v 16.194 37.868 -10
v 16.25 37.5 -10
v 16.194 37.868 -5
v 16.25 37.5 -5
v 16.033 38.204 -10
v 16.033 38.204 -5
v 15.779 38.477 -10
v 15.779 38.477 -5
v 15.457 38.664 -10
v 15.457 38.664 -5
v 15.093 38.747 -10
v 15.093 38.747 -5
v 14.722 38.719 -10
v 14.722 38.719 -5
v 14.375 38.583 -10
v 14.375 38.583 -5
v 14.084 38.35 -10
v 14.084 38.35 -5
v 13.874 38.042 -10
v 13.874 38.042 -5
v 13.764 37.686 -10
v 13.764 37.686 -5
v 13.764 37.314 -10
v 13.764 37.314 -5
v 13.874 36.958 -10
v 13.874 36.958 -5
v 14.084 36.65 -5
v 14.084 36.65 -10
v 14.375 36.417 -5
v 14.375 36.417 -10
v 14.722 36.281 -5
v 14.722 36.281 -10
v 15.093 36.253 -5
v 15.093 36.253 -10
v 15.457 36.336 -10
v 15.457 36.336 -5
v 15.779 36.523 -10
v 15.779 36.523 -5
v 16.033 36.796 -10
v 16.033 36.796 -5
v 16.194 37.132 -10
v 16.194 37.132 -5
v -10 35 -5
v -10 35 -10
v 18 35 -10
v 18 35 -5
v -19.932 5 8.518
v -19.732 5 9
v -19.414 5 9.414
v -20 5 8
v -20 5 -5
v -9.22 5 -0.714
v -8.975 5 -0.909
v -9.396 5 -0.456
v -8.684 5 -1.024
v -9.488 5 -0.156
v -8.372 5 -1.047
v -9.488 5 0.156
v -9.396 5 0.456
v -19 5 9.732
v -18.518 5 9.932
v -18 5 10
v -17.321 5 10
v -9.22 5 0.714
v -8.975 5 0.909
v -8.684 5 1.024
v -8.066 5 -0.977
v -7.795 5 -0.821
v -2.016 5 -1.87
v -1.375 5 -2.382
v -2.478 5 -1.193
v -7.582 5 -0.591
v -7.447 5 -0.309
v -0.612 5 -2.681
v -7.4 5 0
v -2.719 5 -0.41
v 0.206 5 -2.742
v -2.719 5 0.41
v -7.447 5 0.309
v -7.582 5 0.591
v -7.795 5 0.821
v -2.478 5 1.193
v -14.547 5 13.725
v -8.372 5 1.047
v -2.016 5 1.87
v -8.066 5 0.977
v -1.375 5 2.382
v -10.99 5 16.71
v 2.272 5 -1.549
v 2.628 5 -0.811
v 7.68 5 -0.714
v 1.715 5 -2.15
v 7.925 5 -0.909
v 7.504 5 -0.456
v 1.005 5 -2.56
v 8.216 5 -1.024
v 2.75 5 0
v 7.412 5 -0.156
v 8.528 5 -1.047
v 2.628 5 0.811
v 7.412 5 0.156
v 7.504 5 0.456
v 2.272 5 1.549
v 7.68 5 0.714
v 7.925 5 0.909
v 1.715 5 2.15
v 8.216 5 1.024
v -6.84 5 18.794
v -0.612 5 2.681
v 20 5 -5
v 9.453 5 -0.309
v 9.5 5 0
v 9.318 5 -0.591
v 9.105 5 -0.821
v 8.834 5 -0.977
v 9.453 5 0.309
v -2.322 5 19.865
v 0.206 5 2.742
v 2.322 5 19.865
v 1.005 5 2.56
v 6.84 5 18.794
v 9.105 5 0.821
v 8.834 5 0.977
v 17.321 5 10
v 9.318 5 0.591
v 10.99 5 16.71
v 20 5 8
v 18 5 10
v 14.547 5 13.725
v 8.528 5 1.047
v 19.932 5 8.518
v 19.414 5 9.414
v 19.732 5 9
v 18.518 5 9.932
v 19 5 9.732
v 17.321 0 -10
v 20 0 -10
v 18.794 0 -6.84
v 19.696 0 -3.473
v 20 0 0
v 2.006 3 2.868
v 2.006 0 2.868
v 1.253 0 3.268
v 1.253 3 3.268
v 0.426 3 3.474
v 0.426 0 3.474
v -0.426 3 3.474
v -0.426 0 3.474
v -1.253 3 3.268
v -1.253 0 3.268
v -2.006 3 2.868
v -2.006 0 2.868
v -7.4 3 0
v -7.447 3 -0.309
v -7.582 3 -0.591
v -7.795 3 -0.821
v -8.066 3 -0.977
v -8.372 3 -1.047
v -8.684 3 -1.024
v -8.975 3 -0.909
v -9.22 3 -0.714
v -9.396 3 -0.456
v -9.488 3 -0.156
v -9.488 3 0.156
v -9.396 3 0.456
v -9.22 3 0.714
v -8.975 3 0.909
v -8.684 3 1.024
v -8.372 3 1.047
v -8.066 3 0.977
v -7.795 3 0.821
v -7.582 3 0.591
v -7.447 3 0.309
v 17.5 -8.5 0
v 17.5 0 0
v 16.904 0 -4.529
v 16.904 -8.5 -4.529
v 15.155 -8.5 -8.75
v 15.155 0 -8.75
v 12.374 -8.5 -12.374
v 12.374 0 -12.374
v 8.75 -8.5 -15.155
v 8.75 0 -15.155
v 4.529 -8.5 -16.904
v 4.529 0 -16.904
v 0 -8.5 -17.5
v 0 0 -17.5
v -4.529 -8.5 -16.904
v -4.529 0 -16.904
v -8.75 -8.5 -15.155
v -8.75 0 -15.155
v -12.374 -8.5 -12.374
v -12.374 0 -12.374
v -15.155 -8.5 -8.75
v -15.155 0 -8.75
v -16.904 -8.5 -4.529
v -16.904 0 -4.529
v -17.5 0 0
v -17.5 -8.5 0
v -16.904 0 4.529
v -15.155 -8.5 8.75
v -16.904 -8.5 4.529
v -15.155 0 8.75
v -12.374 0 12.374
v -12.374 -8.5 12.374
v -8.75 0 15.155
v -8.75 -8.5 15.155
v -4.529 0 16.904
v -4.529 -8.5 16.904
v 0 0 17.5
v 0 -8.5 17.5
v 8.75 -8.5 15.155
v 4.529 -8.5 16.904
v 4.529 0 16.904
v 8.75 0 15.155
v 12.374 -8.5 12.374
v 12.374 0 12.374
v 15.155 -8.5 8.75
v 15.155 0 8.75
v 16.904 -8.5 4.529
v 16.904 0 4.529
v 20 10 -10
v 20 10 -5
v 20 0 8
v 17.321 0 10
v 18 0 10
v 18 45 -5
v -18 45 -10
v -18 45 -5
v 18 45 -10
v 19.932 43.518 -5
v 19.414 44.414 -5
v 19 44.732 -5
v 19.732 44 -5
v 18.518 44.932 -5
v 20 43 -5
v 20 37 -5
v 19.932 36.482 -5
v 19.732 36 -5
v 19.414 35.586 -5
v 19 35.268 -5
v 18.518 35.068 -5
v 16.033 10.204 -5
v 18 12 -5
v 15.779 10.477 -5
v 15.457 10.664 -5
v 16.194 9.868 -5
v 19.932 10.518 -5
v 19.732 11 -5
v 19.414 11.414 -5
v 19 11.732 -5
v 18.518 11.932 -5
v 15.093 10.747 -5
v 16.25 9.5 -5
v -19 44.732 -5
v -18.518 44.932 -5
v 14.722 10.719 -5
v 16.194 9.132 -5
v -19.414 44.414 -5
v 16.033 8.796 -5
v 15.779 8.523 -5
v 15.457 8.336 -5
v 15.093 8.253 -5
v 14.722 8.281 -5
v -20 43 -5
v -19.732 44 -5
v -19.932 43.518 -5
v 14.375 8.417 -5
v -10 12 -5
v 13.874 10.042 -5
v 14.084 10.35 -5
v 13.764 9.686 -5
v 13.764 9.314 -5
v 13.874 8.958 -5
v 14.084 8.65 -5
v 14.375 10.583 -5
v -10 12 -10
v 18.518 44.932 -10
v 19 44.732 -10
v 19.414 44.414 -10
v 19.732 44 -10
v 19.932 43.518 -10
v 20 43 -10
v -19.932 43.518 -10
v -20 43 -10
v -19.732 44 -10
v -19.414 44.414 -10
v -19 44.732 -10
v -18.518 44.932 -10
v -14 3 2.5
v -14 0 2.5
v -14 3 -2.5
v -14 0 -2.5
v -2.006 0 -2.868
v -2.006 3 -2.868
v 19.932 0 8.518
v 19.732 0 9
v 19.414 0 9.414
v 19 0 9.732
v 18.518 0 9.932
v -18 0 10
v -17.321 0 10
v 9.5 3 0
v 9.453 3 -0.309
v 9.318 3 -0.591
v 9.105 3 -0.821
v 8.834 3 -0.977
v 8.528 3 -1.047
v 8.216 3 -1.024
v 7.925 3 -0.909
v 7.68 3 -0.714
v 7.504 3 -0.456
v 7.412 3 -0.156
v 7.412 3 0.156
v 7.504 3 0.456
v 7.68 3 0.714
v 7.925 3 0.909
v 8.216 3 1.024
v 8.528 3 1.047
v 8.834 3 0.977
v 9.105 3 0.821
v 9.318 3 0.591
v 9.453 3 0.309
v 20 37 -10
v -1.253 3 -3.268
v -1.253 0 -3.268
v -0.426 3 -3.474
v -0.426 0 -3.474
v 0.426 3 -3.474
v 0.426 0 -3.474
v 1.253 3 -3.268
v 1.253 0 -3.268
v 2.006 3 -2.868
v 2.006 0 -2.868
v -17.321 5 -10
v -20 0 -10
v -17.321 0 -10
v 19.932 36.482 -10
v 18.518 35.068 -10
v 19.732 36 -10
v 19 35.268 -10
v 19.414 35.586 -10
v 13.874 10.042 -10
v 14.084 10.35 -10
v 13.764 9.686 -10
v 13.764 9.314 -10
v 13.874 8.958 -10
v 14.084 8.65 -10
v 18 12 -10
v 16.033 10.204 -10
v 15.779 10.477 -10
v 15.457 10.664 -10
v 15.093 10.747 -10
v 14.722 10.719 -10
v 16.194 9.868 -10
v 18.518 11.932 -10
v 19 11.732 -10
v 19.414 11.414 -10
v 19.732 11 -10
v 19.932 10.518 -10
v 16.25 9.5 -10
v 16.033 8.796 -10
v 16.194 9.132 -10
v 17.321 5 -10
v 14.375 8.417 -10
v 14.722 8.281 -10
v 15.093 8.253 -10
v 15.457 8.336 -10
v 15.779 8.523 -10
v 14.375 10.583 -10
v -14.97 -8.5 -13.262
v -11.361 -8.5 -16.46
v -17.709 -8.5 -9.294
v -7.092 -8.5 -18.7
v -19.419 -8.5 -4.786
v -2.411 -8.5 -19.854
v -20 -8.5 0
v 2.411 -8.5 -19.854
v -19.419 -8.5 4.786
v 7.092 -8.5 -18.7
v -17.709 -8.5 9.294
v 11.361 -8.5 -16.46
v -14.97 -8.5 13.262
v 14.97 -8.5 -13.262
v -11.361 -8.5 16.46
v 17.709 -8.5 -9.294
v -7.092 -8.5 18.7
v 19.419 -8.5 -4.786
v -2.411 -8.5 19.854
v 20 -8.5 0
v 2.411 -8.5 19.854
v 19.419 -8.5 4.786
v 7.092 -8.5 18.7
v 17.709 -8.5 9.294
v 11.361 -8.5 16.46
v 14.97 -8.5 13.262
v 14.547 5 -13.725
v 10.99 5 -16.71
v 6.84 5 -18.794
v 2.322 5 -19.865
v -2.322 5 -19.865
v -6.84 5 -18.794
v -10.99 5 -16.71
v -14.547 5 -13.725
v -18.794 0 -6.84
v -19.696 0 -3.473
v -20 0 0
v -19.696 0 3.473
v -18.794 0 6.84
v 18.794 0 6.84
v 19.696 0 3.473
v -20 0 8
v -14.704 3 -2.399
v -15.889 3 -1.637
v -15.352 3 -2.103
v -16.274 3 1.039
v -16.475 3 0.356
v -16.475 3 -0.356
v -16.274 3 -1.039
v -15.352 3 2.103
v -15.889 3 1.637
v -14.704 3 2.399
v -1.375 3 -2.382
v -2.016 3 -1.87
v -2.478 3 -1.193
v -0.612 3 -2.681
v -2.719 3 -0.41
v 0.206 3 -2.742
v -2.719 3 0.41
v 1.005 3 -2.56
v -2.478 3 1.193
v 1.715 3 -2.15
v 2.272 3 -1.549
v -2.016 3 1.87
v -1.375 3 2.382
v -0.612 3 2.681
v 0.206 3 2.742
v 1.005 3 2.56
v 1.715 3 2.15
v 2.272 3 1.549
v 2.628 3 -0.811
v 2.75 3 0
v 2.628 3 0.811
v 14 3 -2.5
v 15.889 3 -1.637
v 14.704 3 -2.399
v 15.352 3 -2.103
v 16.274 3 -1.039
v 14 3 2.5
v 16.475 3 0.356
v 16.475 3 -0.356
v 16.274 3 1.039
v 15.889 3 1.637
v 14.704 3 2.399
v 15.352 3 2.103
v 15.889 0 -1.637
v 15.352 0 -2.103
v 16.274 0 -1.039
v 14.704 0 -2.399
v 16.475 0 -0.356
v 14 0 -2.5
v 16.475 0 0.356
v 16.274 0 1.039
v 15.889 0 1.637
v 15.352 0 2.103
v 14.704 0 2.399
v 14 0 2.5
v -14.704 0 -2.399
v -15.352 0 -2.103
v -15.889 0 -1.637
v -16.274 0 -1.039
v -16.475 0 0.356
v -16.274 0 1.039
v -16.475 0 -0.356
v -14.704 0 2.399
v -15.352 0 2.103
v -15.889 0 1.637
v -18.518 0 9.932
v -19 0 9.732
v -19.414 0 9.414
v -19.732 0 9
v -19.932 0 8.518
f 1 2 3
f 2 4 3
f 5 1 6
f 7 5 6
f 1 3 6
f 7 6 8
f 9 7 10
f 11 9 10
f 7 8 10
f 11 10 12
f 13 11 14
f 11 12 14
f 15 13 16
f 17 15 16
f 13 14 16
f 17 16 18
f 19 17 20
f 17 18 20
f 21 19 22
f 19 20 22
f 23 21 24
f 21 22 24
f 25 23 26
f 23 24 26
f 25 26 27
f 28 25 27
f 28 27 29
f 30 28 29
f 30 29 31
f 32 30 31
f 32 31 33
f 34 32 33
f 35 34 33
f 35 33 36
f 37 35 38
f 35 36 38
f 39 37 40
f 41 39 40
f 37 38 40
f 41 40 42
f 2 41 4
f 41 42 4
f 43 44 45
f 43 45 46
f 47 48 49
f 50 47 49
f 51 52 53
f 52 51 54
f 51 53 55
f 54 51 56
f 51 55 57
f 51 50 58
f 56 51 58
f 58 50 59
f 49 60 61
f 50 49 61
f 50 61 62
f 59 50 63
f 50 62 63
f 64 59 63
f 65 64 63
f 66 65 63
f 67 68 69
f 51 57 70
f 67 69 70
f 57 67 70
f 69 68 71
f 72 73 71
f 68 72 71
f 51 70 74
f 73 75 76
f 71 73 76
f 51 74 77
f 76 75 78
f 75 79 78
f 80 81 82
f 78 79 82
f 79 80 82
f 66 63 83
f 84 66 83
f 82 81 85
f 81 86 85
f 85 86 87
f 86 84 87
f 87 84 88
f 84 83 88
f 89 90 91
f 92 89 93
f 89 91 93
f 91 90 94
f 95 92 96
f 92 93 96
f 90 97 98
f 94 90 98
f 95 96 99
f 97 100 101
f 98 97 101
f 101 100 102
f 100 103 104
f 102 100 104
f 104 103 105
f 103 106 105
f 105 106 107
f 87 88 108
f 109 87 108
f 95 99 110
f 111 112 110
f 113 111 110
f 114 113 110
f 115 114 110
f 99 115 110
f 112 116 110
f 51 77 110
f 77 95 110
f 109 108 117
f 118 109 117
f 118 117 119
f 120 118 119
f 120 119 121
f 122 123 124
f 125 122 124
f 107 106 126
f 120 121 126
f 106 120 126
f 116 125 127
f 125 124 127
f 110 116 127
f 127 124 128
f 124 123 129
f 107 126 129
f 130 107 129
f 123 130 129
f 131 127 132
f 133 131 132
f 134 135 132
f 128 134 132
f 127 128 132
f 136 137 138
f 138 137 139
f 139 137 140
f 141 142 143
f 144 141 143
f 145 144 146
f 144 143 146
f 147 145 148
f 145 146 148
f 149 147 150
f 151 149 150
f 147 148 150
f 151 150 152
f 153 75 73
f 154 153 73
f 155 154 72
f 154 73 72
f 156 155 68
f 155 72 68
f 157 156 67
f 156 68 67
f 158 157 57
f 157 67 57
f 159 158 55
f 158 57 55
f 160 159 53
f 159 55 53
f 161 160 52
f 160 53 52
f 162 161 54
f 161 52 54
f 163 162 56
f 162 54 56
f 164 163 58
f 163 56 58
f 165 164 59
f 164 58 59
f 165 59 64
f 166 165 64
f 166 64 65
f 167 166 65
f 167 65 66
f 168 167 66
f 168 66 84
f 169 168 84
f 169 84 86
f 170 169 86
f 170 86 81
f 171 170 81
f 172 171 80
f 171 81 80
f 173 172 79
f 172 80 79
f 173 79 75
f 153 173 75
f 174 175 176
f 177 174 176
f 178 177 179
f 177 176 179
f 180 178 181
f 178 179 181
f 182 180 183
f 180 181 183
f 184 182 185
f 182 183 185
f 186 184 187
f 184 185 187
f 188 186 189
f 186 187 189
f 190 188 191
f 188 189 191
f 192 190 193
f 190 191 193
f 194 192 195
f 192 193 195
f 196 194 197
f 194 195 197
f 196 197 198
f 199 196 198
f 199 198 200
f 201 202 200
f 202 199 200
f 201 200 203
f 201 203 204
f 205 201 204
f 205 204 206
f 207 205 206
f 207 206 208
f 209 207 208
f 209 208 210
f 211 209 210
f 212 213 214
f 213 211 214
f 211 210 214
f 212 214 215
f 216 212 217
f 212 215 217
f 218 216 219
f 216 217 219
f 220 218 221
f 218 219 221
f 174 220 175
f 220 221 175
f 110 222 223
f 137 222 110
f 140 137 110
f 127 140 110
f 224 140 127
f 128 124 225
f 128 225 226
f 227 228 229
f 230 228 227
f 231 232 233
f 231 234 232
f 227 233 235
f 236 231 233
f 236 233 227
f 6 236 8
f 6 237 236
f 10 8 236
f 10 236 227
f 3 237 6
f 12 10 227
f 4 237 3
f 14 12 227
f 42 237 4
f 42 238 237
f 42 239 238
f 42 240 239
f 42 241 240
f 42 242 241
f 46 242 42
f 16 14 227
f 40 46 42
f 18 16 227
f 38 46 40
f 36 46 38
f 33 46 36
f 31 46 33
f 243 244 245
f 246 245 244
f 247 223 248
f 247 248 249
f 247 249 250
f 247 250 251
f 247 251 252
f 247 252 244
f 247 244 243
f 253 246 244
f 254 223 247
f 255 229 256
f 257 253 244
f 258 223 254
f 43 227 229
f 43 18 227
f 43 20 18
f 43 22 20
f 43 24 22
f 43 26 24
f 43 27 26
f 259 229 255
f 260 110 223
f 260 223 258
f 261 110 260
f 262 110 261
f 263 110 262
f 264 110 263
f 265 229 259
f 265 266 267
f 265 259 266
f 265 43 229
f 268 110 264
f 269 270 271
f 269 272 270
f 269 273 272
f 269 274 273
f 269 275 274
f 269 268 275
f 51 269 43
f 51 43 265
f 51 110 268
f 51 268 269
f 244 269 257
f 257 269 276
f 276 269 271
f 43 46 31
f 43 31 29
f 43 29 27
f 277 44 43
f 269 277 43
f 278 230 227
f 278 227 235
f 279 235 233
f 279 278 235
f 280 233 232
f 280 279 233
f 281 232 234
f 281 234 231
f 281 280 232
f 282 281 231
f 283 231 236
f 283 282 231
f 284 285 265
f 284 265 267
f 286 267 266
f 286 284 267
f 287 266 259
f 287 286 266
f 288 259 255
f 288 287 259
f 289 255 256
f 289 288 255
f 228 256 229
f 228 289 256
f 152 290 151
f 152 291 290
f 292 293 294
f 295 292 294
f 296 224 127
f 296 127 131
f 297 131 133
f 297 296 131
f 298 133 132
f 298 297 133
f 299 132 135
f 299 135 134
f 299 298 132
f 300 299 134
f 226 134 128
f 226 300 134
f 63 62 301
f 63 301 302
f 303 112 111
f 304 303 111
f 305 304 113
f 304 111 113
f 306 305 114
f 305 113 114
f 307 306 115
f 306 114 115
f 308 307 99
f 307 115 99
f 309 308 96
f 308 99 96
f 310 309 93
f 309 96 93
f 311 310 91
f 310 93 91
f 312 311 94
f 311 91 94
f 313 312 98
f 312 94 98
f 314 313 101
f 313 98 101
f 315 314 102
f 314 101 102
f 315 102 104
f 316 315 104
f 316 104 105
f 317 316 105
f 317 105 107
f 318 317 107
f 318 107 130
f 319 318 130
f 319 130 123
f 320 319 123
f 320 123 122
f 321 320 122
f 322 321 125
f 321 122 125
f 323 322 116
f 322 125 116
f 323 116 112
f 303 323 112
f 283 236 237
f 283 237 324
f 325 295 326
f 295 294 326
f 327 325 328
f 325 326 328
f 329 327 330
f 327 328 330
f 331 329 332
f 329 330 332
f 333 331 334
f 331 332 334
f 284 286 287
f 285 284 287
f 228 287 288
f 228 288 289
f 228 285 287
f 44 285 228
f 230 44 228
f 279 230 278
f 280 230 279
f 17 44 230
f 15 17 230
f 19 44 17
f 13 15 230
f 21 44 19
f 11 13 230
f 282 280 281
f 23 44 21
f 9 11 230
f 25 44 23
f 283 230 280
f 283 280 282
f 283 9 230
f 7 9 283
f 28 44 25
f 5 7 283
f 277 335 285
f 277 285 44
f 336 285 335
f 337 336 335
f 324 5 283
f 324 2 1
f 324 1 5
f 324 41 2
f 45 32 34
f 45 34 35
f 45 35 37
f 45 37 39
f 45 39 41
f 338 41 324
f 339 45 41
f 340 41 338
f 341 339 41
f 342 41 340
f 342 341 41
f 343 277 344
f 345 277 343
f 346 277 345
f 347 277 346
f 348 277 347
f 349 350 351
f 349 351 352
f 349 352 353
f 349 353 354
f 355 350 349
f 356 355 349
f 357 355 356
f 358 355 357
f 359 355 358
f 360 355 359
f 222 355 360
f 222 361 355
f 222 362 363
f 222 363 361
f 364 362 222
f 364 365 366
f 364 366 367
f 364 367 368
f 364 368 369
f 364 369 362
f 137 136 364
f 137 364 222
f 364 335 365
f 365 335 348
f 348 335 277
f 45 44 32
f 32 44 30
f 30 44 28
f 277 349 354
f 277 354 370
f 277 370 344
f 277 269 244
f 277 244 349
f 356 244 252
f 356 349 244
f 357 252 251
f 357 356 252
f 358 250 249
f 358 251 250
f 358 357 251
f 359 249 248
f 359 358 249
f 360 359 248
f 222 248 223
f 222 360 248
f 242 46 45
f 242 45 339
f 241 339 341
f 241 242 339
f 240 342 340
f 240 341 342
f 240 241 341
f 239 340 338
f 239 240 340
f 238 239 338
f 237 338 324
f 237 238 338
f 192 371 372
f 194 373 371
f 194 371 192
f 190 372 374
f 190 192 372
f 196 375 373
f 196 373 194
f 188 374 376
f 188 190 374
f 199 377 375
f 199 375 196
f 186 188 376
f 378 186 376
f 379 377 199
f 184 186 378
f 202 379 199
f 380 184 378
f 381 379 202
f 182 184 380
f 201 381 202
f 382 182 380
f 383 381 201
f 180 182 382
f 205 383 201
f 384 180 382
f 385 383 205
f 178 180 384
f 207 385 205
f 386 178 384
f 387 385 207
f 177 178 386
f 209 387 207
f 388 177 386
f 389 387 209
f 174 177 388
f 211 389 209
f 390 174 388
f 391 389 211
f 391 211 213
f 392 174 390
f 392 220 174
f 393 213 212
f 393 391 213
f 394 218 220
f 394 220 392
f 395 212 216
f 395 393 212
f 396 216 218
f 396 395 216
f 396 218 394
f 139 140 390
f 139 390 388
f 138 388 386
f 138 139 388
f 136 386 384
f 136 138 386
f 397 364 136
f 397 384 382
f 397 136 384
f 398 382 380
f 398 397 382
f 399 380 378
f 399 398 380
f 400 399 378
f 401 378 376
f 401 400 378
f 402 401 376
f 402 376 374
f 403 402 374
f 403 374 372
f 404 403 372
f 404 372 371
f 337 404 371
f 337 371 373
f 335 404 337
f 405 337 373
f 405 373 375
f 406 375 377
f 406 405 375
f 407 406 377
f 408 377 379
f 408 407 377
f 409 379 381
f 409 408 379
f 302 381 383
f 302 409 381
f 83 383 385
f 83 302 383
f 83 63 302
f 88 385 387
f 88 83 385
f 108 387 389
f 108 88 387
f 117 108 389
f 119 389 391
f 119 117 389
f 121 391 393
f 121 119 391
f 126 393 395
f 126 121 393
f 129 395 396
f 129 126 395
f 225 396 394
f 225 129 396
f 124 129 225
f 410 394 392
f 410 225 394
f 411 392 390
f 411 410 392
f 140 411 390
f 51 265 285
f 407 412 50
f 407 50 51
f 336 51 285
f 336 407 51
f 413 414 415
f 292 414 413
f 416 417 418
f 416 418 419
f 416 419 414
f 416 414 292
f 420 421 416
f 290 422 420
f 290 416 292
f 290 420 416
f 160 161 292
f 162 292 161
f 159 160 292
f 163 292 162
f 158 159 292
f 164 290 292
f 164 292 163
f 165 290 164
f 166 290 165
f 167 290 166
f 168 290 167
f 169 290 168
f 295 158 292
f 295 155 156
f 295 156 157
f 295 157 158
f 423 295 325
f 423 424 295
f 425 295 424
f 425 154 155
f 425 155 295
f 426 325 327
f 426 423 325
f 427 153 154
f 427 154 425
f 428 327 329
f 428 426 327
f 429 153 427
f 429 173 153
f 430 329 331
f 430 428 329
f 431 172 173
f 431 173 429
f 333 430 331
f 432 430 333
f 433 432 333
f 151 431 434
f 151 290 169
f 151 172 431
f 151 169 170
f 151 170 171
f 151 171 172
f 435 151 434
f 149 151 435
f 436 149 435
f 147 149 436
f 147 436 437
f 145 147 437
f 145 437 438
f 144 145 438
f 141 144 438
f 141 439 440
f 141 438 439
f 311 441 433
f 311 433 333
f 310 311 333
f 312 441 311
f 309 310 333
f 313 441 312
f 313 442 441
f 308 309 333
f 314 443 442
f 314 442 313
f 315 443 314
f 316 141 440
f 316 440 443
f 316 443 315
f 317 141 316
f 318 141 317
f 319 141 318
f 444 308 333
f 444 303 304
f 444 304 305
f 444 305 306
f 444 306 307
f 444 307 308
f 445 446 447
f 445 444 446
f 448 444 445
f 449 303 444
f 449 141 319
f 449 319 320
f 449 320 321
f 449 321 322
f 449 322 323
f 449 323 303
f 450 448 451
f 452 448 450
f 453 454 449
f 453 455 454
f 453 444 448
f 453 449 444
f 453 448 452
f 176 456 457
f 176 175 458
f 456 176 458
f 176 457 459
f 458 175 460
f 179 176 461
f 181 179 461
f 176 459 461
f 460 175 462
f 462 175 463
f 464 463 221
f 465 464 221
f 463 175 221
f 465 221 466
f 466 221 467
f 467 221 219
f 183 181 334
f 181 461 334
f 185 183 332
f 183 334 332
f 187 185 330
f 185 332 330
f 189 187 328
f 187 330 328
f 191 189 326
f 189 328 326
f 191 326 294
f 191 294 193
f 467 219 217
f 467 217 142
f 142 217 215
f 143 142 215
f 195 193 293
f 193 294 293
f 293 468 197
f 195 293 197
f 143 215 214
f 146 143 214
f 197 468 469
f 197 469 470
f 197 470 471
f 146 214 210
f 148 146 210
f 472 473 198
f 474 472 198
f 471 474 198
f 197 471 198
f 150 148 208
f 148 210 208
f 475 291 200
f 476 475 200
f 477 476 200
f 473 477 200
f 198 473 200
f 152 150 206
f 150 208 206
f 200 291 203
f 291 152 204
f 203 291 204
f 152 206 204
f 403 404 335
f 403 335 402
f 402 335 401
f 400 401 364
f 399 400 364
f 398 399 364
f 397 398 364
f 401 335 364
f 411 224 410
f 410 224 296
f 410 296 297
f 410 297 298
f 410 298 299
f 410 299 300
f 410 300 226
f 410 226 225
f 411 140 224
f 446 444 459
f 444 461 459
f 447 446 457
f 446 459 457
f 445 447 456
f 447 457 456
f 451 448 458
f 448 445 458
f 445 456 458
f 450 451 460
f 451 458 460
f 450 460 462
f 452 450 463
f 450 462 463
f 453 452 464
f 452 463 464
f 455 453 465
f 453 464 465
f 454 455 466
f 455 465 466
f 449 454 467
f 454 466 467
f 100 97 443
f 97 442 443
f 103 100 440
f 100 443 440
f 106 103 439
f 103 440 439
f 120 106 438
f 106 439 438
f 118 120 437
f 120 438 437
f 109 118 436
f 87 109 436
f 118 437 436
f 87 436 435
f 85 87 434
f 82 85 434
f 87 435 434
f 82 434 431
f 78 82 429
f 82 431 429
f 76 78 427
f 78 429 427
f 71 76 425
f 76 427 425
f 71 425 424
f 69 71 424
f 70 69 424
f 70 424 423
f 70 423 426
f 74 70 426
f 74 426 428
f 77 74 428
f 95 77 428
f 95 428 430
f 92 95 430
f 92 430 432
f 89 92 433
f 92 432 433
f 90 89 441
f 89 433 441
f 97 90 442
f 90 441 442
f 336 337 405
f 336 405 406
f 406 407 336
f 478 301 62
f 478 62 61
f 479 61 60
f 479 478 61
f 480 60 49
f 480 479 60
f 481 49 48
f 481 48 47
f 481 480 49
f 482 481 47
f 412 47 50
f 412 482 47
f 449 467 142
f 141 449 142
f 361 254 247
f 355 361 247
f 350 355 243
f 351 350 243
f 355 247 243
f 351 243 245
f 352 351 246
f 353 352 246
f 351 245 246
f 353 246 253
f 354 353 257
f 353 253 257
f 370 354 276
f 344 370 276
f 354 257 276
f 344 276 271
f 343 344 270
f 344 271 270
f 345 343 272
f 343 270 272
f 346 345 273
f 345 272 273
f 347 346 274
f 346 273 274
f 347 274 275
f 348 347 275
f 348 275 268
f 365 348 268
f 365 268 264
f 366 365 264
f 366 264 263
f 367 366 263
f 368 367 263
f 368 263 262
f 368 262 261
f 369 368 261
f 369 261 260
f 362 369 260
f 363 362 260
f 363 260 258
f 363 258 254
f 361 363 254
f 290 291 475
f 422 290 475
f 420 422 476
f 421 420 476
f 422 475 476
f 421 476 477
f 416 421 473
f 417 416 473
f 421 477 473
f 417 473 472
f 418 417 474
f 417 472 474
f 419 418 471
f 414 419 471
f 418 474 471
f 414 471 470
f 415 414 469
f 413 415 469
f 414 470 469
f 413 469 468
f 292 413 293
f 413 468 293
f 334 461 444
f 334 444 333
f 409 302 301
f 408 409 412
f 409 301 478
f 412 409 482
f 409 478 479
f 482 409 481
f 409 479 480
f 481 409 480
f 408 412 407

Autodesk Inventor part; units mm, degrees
ref_plane "YZ Plane" through (0, 0, 0) normal (1, 0, 0) x (0, 1, 0)
ref_plane "XZ Plane" through (0, 0, 0) normal (0, 1, 0) x (-1, 0, 0)
ref_plane "XY Plane" through (0, 0, 0) normal (0, 0, 1) x (1, 0, 0)
sketch "Sketch1" plane through (0, 0, 0) normal (0, 1, 0) x (-1, 0, 0)
  line L0 (-20, 20) -> (20, 20)
  line L1 (20, 20) -> (20, -20)
  line L2 (20, -20) -> (-20, -20)
  line L3 (-20, -20) -> (-20, 20)
  line L4 (-20, 20) -> (20, -20) construction
  line L5 (20, 20) -> (-20, -20) construction
  point P0 (0, 0)
  dimension "d0" = 40
  dimension "d1" = 40
extrude "Extrusion1" add sketch "Sketch1" along normal blind 5
sketch "Sketch4" plane through (0, 5, 0) normal (0, 1, 0) x (1, 0, 0)
  line L0 (-20, 10) -> (-10, 10)
  line L1 (-10, 10) -> (-10, 5)
  line L2 (-10, 5) -> (-20, 5)
  line L3 (-20, 5) -> (-20, 10)
  line L4 (-20, 10) -> (-10, 5) construction
  line L5 (-10, 10) -> (-20, 5) construction
  line L6 (-20, -20) -> (20, -20) projected
  line L7 (20, -20) -> (20, 20) projected
  line L8 (-20, 20) -> (-20, -20) projected
  point P0 (-15, 7.5)
  dimension "d20" = 10
  dimension "d21" = 5
  dimension "d23" = 25
extrude "Extrusion4" add sketch "Sketch4" along normal blind 40
sketch "Sketch8" plane through (-10, 5, -5) normal (1, 0, 0) x (0, 0, -1)
  line L0 (0, 40) -> (5, 40)
  line L1 (5, 40) -> (5, 30)
  line L2 (5, 30) -> (0, 30)
  line L3 (0, 30) -> (0, 40)
  line L4 (0, 7) -> (5, 7)
  line L5 (5, 7) -> (5, 0)
  line L6 (5, 0) -> (0, 0)
  line L7 (0, 0) -> (0, 7)
  line L8 (5, 0) -> (5, 40) projected
  line L9 (0, 40) -> (5, 40) projected
  point P0 (-5, -5)
  dimension "d44" = 5
  dimension "d45" = 10
  dimension "d46" = 5
  dimension "d47" = 7
  dimension "d48" = 23
extrude "Extrusion7" add sketch "Sketch8" along normal blind 30
sketch "Sketch9" plane through (-20, 5, -5) normal (0, 0, 1) x (1, 0, 0)
  circle A0 centre (35, 32.5) radius 1.25
  circle A1 centre (35, 4.5) radius 1.25
  line L0 (10, 30) -> (40, 30) projected
  line L1 (40, 40) -> (40, 30) projected
  line L2 (40, 7) -> (40, 0) projected
  point P0 (20, -5)
  dimension "d51" = 2.5
  dimension "d52" = 2.5
  dimension "d53" = 28
  dimension "d54" = 2.5
  dimension "d55" = 5
  dimension "d56" = 5
extrude "Extrusion8" cut sketch "Sketch9" against normal blind 5
sketch "Sketch11" plane through (0, 5, 0) normal (0, 1, 0) x (1, 0, 0)
  line L0 (20, -20) -> (-20, -20)
  line L1 (-20, -20) -> (-20, -10)
  line L2 (-20, -10) -> (20, -10)
  line L3 (20, -10) -> (20, -20)
  line L4 (-20, 10) -> (20, 10)
  line L5 (20, 10) -> (20, 20)
  line L6 (20, 20) -> (-20, 20)
  line L7 (-20, 20) -> (-20, 10)
  line L8 (20, 20) -> (-20, 20) projected
  line L9 (-20, -20) -> (20, -20) projected
  line L10 (20, -20) -> (20, 5) projected
  line L11 (20, 10) -> (20, 20) projected
  point P0 (0, 0)
  dimension "d59" = 40
  dimension "d60" = 10
  dimension "d61" = 40
  dimension "d62" = 10
extrude "Extrusion9" cut sketch "Sketch11" against normal blind 5
sketch "Sketch12" plane through (0, 0, 0) normal (0, -1, 0) x (1, 0, 0)
  circle A0 centre (0, 0) radius 3.5
  circle A1 centre (14, 0) radius 2.5
  circle A2 centre (-14, 0) radius 2.5
  line L0 (-20, -10) -> (20, -10) projected
  line L1 (-14, 2.5) -> (-2.0057, 2.8683)
  line L2 (-14, -2.5) -> (-2.0057, -2.8683)
  line L3 (14, 2.5) -> (2.0057, 2.8683)
  line L4 (14, -2.5) -> (2.0057, -2.8683)
  dimension "d65" = 7
  dimension "d66" = 5
  dimension "d67" = 5
  dimension "d68" = 14
  dimension "d69" = 10
  dimension "d70" = 10
  dimension "d71" = 14
  dimension "d72" = 12
  dimension "d73" = 12
extrude "Extrusion10" cut sketch "Sketch12" against normal blind 3
sketch "Sketch13" plane through (0, 3, 0) normal (0, -1, 0) x (1, 0, 0)
  circle A0 centre (0, 0) radius 2.75
  dimension "d76" = 5.5
extrude "Extrusion11" cut sketch "Sketch13" against normal blind 3
fillet "Fillet1" radius 2 6 edges at (20, 45, -7.5) (20, 35, -7.5) (20, 12, -7.5) (20, 2.5, 10) (-20, 2.5, 10) (-20, 45, -7.5)
sketch "Sketch14" plane through (0, 0, 0) normal (0, -1, 0) x (1, 0, 0)
  circle A0 centre (0, 0) radius 17.5
  circle A1 centre (0, 0) radius 20
  dimension "d80" = 35
  dimension "d81" = 40
extrude "Extrusion12" add sketch "Sketch14" along normal blind 8.5
sketch "Sketch15" plane through (0, 0, 0) normal (0, -1, 0) x (1, 0, 0)
  circle A0 centre (0, 0) radius 17.5 projected
  arc A1 (2.0057, 2.8683) -> (-2.0057, 2.8683) centre (0, 0) ccw projected
  line L0 (2.0057, 2.8683) -> (14, 2.5) projected
  arc A2 (14, -2.5) -> (14, 2.5) centre (14, 0) ccw projected
  line L1 (14, -2.5) -> (2.0057, -2.8683) projected
  arc A3 (-2.0057, -2.8683) -> (2.0057, -2.8683) centre (0, 0) ccw projected
  line L2 (-2.0057, -2.8683) -> (-14, -2.5) projected
  arc A4 (-14, 2.5) -> (-14, -2.5) centre (-14, 0) ccw projected
  line L3 (-14, 2.5) -> (-2.0057, 2.8683) projected
  arc A5 (14.3614, -10) -> (14.3614, 10) centre (0, 0) ccw projected
  line L4 (14.3614, 10) -> (-14.3614, 10) projected
  arc A6 (-14.3614, 10) -> (-14.3614, -10) centre (0, 0) ccw projected
  line L5 (-14.3614, -10) -> (14.3614, -10) projected
  circle A7 centre (0, 0) radius 20 projected
  point P0 (14.3614, 10)
extrude "Extrusion13" add sketch "Sketch15" against normal blind 5 contours L4 A0 | A0 L5 | A7
sketch "Sketch16" plane through (0, 5, 0) normal (0, 1, 0) x (1, 0, 0)
  circle A0 centre (8.45, 0) radius 1.05
  circle A1 centre (-8.45, 0) radius 1.05
  point P0 (0, 0)
  dimension "d86" = 2.1
  dimension "d87" = 2.1
extrude "Extrusion14" cut sketch "Sketch16" against normal through all
properties part number "head_bottom"
